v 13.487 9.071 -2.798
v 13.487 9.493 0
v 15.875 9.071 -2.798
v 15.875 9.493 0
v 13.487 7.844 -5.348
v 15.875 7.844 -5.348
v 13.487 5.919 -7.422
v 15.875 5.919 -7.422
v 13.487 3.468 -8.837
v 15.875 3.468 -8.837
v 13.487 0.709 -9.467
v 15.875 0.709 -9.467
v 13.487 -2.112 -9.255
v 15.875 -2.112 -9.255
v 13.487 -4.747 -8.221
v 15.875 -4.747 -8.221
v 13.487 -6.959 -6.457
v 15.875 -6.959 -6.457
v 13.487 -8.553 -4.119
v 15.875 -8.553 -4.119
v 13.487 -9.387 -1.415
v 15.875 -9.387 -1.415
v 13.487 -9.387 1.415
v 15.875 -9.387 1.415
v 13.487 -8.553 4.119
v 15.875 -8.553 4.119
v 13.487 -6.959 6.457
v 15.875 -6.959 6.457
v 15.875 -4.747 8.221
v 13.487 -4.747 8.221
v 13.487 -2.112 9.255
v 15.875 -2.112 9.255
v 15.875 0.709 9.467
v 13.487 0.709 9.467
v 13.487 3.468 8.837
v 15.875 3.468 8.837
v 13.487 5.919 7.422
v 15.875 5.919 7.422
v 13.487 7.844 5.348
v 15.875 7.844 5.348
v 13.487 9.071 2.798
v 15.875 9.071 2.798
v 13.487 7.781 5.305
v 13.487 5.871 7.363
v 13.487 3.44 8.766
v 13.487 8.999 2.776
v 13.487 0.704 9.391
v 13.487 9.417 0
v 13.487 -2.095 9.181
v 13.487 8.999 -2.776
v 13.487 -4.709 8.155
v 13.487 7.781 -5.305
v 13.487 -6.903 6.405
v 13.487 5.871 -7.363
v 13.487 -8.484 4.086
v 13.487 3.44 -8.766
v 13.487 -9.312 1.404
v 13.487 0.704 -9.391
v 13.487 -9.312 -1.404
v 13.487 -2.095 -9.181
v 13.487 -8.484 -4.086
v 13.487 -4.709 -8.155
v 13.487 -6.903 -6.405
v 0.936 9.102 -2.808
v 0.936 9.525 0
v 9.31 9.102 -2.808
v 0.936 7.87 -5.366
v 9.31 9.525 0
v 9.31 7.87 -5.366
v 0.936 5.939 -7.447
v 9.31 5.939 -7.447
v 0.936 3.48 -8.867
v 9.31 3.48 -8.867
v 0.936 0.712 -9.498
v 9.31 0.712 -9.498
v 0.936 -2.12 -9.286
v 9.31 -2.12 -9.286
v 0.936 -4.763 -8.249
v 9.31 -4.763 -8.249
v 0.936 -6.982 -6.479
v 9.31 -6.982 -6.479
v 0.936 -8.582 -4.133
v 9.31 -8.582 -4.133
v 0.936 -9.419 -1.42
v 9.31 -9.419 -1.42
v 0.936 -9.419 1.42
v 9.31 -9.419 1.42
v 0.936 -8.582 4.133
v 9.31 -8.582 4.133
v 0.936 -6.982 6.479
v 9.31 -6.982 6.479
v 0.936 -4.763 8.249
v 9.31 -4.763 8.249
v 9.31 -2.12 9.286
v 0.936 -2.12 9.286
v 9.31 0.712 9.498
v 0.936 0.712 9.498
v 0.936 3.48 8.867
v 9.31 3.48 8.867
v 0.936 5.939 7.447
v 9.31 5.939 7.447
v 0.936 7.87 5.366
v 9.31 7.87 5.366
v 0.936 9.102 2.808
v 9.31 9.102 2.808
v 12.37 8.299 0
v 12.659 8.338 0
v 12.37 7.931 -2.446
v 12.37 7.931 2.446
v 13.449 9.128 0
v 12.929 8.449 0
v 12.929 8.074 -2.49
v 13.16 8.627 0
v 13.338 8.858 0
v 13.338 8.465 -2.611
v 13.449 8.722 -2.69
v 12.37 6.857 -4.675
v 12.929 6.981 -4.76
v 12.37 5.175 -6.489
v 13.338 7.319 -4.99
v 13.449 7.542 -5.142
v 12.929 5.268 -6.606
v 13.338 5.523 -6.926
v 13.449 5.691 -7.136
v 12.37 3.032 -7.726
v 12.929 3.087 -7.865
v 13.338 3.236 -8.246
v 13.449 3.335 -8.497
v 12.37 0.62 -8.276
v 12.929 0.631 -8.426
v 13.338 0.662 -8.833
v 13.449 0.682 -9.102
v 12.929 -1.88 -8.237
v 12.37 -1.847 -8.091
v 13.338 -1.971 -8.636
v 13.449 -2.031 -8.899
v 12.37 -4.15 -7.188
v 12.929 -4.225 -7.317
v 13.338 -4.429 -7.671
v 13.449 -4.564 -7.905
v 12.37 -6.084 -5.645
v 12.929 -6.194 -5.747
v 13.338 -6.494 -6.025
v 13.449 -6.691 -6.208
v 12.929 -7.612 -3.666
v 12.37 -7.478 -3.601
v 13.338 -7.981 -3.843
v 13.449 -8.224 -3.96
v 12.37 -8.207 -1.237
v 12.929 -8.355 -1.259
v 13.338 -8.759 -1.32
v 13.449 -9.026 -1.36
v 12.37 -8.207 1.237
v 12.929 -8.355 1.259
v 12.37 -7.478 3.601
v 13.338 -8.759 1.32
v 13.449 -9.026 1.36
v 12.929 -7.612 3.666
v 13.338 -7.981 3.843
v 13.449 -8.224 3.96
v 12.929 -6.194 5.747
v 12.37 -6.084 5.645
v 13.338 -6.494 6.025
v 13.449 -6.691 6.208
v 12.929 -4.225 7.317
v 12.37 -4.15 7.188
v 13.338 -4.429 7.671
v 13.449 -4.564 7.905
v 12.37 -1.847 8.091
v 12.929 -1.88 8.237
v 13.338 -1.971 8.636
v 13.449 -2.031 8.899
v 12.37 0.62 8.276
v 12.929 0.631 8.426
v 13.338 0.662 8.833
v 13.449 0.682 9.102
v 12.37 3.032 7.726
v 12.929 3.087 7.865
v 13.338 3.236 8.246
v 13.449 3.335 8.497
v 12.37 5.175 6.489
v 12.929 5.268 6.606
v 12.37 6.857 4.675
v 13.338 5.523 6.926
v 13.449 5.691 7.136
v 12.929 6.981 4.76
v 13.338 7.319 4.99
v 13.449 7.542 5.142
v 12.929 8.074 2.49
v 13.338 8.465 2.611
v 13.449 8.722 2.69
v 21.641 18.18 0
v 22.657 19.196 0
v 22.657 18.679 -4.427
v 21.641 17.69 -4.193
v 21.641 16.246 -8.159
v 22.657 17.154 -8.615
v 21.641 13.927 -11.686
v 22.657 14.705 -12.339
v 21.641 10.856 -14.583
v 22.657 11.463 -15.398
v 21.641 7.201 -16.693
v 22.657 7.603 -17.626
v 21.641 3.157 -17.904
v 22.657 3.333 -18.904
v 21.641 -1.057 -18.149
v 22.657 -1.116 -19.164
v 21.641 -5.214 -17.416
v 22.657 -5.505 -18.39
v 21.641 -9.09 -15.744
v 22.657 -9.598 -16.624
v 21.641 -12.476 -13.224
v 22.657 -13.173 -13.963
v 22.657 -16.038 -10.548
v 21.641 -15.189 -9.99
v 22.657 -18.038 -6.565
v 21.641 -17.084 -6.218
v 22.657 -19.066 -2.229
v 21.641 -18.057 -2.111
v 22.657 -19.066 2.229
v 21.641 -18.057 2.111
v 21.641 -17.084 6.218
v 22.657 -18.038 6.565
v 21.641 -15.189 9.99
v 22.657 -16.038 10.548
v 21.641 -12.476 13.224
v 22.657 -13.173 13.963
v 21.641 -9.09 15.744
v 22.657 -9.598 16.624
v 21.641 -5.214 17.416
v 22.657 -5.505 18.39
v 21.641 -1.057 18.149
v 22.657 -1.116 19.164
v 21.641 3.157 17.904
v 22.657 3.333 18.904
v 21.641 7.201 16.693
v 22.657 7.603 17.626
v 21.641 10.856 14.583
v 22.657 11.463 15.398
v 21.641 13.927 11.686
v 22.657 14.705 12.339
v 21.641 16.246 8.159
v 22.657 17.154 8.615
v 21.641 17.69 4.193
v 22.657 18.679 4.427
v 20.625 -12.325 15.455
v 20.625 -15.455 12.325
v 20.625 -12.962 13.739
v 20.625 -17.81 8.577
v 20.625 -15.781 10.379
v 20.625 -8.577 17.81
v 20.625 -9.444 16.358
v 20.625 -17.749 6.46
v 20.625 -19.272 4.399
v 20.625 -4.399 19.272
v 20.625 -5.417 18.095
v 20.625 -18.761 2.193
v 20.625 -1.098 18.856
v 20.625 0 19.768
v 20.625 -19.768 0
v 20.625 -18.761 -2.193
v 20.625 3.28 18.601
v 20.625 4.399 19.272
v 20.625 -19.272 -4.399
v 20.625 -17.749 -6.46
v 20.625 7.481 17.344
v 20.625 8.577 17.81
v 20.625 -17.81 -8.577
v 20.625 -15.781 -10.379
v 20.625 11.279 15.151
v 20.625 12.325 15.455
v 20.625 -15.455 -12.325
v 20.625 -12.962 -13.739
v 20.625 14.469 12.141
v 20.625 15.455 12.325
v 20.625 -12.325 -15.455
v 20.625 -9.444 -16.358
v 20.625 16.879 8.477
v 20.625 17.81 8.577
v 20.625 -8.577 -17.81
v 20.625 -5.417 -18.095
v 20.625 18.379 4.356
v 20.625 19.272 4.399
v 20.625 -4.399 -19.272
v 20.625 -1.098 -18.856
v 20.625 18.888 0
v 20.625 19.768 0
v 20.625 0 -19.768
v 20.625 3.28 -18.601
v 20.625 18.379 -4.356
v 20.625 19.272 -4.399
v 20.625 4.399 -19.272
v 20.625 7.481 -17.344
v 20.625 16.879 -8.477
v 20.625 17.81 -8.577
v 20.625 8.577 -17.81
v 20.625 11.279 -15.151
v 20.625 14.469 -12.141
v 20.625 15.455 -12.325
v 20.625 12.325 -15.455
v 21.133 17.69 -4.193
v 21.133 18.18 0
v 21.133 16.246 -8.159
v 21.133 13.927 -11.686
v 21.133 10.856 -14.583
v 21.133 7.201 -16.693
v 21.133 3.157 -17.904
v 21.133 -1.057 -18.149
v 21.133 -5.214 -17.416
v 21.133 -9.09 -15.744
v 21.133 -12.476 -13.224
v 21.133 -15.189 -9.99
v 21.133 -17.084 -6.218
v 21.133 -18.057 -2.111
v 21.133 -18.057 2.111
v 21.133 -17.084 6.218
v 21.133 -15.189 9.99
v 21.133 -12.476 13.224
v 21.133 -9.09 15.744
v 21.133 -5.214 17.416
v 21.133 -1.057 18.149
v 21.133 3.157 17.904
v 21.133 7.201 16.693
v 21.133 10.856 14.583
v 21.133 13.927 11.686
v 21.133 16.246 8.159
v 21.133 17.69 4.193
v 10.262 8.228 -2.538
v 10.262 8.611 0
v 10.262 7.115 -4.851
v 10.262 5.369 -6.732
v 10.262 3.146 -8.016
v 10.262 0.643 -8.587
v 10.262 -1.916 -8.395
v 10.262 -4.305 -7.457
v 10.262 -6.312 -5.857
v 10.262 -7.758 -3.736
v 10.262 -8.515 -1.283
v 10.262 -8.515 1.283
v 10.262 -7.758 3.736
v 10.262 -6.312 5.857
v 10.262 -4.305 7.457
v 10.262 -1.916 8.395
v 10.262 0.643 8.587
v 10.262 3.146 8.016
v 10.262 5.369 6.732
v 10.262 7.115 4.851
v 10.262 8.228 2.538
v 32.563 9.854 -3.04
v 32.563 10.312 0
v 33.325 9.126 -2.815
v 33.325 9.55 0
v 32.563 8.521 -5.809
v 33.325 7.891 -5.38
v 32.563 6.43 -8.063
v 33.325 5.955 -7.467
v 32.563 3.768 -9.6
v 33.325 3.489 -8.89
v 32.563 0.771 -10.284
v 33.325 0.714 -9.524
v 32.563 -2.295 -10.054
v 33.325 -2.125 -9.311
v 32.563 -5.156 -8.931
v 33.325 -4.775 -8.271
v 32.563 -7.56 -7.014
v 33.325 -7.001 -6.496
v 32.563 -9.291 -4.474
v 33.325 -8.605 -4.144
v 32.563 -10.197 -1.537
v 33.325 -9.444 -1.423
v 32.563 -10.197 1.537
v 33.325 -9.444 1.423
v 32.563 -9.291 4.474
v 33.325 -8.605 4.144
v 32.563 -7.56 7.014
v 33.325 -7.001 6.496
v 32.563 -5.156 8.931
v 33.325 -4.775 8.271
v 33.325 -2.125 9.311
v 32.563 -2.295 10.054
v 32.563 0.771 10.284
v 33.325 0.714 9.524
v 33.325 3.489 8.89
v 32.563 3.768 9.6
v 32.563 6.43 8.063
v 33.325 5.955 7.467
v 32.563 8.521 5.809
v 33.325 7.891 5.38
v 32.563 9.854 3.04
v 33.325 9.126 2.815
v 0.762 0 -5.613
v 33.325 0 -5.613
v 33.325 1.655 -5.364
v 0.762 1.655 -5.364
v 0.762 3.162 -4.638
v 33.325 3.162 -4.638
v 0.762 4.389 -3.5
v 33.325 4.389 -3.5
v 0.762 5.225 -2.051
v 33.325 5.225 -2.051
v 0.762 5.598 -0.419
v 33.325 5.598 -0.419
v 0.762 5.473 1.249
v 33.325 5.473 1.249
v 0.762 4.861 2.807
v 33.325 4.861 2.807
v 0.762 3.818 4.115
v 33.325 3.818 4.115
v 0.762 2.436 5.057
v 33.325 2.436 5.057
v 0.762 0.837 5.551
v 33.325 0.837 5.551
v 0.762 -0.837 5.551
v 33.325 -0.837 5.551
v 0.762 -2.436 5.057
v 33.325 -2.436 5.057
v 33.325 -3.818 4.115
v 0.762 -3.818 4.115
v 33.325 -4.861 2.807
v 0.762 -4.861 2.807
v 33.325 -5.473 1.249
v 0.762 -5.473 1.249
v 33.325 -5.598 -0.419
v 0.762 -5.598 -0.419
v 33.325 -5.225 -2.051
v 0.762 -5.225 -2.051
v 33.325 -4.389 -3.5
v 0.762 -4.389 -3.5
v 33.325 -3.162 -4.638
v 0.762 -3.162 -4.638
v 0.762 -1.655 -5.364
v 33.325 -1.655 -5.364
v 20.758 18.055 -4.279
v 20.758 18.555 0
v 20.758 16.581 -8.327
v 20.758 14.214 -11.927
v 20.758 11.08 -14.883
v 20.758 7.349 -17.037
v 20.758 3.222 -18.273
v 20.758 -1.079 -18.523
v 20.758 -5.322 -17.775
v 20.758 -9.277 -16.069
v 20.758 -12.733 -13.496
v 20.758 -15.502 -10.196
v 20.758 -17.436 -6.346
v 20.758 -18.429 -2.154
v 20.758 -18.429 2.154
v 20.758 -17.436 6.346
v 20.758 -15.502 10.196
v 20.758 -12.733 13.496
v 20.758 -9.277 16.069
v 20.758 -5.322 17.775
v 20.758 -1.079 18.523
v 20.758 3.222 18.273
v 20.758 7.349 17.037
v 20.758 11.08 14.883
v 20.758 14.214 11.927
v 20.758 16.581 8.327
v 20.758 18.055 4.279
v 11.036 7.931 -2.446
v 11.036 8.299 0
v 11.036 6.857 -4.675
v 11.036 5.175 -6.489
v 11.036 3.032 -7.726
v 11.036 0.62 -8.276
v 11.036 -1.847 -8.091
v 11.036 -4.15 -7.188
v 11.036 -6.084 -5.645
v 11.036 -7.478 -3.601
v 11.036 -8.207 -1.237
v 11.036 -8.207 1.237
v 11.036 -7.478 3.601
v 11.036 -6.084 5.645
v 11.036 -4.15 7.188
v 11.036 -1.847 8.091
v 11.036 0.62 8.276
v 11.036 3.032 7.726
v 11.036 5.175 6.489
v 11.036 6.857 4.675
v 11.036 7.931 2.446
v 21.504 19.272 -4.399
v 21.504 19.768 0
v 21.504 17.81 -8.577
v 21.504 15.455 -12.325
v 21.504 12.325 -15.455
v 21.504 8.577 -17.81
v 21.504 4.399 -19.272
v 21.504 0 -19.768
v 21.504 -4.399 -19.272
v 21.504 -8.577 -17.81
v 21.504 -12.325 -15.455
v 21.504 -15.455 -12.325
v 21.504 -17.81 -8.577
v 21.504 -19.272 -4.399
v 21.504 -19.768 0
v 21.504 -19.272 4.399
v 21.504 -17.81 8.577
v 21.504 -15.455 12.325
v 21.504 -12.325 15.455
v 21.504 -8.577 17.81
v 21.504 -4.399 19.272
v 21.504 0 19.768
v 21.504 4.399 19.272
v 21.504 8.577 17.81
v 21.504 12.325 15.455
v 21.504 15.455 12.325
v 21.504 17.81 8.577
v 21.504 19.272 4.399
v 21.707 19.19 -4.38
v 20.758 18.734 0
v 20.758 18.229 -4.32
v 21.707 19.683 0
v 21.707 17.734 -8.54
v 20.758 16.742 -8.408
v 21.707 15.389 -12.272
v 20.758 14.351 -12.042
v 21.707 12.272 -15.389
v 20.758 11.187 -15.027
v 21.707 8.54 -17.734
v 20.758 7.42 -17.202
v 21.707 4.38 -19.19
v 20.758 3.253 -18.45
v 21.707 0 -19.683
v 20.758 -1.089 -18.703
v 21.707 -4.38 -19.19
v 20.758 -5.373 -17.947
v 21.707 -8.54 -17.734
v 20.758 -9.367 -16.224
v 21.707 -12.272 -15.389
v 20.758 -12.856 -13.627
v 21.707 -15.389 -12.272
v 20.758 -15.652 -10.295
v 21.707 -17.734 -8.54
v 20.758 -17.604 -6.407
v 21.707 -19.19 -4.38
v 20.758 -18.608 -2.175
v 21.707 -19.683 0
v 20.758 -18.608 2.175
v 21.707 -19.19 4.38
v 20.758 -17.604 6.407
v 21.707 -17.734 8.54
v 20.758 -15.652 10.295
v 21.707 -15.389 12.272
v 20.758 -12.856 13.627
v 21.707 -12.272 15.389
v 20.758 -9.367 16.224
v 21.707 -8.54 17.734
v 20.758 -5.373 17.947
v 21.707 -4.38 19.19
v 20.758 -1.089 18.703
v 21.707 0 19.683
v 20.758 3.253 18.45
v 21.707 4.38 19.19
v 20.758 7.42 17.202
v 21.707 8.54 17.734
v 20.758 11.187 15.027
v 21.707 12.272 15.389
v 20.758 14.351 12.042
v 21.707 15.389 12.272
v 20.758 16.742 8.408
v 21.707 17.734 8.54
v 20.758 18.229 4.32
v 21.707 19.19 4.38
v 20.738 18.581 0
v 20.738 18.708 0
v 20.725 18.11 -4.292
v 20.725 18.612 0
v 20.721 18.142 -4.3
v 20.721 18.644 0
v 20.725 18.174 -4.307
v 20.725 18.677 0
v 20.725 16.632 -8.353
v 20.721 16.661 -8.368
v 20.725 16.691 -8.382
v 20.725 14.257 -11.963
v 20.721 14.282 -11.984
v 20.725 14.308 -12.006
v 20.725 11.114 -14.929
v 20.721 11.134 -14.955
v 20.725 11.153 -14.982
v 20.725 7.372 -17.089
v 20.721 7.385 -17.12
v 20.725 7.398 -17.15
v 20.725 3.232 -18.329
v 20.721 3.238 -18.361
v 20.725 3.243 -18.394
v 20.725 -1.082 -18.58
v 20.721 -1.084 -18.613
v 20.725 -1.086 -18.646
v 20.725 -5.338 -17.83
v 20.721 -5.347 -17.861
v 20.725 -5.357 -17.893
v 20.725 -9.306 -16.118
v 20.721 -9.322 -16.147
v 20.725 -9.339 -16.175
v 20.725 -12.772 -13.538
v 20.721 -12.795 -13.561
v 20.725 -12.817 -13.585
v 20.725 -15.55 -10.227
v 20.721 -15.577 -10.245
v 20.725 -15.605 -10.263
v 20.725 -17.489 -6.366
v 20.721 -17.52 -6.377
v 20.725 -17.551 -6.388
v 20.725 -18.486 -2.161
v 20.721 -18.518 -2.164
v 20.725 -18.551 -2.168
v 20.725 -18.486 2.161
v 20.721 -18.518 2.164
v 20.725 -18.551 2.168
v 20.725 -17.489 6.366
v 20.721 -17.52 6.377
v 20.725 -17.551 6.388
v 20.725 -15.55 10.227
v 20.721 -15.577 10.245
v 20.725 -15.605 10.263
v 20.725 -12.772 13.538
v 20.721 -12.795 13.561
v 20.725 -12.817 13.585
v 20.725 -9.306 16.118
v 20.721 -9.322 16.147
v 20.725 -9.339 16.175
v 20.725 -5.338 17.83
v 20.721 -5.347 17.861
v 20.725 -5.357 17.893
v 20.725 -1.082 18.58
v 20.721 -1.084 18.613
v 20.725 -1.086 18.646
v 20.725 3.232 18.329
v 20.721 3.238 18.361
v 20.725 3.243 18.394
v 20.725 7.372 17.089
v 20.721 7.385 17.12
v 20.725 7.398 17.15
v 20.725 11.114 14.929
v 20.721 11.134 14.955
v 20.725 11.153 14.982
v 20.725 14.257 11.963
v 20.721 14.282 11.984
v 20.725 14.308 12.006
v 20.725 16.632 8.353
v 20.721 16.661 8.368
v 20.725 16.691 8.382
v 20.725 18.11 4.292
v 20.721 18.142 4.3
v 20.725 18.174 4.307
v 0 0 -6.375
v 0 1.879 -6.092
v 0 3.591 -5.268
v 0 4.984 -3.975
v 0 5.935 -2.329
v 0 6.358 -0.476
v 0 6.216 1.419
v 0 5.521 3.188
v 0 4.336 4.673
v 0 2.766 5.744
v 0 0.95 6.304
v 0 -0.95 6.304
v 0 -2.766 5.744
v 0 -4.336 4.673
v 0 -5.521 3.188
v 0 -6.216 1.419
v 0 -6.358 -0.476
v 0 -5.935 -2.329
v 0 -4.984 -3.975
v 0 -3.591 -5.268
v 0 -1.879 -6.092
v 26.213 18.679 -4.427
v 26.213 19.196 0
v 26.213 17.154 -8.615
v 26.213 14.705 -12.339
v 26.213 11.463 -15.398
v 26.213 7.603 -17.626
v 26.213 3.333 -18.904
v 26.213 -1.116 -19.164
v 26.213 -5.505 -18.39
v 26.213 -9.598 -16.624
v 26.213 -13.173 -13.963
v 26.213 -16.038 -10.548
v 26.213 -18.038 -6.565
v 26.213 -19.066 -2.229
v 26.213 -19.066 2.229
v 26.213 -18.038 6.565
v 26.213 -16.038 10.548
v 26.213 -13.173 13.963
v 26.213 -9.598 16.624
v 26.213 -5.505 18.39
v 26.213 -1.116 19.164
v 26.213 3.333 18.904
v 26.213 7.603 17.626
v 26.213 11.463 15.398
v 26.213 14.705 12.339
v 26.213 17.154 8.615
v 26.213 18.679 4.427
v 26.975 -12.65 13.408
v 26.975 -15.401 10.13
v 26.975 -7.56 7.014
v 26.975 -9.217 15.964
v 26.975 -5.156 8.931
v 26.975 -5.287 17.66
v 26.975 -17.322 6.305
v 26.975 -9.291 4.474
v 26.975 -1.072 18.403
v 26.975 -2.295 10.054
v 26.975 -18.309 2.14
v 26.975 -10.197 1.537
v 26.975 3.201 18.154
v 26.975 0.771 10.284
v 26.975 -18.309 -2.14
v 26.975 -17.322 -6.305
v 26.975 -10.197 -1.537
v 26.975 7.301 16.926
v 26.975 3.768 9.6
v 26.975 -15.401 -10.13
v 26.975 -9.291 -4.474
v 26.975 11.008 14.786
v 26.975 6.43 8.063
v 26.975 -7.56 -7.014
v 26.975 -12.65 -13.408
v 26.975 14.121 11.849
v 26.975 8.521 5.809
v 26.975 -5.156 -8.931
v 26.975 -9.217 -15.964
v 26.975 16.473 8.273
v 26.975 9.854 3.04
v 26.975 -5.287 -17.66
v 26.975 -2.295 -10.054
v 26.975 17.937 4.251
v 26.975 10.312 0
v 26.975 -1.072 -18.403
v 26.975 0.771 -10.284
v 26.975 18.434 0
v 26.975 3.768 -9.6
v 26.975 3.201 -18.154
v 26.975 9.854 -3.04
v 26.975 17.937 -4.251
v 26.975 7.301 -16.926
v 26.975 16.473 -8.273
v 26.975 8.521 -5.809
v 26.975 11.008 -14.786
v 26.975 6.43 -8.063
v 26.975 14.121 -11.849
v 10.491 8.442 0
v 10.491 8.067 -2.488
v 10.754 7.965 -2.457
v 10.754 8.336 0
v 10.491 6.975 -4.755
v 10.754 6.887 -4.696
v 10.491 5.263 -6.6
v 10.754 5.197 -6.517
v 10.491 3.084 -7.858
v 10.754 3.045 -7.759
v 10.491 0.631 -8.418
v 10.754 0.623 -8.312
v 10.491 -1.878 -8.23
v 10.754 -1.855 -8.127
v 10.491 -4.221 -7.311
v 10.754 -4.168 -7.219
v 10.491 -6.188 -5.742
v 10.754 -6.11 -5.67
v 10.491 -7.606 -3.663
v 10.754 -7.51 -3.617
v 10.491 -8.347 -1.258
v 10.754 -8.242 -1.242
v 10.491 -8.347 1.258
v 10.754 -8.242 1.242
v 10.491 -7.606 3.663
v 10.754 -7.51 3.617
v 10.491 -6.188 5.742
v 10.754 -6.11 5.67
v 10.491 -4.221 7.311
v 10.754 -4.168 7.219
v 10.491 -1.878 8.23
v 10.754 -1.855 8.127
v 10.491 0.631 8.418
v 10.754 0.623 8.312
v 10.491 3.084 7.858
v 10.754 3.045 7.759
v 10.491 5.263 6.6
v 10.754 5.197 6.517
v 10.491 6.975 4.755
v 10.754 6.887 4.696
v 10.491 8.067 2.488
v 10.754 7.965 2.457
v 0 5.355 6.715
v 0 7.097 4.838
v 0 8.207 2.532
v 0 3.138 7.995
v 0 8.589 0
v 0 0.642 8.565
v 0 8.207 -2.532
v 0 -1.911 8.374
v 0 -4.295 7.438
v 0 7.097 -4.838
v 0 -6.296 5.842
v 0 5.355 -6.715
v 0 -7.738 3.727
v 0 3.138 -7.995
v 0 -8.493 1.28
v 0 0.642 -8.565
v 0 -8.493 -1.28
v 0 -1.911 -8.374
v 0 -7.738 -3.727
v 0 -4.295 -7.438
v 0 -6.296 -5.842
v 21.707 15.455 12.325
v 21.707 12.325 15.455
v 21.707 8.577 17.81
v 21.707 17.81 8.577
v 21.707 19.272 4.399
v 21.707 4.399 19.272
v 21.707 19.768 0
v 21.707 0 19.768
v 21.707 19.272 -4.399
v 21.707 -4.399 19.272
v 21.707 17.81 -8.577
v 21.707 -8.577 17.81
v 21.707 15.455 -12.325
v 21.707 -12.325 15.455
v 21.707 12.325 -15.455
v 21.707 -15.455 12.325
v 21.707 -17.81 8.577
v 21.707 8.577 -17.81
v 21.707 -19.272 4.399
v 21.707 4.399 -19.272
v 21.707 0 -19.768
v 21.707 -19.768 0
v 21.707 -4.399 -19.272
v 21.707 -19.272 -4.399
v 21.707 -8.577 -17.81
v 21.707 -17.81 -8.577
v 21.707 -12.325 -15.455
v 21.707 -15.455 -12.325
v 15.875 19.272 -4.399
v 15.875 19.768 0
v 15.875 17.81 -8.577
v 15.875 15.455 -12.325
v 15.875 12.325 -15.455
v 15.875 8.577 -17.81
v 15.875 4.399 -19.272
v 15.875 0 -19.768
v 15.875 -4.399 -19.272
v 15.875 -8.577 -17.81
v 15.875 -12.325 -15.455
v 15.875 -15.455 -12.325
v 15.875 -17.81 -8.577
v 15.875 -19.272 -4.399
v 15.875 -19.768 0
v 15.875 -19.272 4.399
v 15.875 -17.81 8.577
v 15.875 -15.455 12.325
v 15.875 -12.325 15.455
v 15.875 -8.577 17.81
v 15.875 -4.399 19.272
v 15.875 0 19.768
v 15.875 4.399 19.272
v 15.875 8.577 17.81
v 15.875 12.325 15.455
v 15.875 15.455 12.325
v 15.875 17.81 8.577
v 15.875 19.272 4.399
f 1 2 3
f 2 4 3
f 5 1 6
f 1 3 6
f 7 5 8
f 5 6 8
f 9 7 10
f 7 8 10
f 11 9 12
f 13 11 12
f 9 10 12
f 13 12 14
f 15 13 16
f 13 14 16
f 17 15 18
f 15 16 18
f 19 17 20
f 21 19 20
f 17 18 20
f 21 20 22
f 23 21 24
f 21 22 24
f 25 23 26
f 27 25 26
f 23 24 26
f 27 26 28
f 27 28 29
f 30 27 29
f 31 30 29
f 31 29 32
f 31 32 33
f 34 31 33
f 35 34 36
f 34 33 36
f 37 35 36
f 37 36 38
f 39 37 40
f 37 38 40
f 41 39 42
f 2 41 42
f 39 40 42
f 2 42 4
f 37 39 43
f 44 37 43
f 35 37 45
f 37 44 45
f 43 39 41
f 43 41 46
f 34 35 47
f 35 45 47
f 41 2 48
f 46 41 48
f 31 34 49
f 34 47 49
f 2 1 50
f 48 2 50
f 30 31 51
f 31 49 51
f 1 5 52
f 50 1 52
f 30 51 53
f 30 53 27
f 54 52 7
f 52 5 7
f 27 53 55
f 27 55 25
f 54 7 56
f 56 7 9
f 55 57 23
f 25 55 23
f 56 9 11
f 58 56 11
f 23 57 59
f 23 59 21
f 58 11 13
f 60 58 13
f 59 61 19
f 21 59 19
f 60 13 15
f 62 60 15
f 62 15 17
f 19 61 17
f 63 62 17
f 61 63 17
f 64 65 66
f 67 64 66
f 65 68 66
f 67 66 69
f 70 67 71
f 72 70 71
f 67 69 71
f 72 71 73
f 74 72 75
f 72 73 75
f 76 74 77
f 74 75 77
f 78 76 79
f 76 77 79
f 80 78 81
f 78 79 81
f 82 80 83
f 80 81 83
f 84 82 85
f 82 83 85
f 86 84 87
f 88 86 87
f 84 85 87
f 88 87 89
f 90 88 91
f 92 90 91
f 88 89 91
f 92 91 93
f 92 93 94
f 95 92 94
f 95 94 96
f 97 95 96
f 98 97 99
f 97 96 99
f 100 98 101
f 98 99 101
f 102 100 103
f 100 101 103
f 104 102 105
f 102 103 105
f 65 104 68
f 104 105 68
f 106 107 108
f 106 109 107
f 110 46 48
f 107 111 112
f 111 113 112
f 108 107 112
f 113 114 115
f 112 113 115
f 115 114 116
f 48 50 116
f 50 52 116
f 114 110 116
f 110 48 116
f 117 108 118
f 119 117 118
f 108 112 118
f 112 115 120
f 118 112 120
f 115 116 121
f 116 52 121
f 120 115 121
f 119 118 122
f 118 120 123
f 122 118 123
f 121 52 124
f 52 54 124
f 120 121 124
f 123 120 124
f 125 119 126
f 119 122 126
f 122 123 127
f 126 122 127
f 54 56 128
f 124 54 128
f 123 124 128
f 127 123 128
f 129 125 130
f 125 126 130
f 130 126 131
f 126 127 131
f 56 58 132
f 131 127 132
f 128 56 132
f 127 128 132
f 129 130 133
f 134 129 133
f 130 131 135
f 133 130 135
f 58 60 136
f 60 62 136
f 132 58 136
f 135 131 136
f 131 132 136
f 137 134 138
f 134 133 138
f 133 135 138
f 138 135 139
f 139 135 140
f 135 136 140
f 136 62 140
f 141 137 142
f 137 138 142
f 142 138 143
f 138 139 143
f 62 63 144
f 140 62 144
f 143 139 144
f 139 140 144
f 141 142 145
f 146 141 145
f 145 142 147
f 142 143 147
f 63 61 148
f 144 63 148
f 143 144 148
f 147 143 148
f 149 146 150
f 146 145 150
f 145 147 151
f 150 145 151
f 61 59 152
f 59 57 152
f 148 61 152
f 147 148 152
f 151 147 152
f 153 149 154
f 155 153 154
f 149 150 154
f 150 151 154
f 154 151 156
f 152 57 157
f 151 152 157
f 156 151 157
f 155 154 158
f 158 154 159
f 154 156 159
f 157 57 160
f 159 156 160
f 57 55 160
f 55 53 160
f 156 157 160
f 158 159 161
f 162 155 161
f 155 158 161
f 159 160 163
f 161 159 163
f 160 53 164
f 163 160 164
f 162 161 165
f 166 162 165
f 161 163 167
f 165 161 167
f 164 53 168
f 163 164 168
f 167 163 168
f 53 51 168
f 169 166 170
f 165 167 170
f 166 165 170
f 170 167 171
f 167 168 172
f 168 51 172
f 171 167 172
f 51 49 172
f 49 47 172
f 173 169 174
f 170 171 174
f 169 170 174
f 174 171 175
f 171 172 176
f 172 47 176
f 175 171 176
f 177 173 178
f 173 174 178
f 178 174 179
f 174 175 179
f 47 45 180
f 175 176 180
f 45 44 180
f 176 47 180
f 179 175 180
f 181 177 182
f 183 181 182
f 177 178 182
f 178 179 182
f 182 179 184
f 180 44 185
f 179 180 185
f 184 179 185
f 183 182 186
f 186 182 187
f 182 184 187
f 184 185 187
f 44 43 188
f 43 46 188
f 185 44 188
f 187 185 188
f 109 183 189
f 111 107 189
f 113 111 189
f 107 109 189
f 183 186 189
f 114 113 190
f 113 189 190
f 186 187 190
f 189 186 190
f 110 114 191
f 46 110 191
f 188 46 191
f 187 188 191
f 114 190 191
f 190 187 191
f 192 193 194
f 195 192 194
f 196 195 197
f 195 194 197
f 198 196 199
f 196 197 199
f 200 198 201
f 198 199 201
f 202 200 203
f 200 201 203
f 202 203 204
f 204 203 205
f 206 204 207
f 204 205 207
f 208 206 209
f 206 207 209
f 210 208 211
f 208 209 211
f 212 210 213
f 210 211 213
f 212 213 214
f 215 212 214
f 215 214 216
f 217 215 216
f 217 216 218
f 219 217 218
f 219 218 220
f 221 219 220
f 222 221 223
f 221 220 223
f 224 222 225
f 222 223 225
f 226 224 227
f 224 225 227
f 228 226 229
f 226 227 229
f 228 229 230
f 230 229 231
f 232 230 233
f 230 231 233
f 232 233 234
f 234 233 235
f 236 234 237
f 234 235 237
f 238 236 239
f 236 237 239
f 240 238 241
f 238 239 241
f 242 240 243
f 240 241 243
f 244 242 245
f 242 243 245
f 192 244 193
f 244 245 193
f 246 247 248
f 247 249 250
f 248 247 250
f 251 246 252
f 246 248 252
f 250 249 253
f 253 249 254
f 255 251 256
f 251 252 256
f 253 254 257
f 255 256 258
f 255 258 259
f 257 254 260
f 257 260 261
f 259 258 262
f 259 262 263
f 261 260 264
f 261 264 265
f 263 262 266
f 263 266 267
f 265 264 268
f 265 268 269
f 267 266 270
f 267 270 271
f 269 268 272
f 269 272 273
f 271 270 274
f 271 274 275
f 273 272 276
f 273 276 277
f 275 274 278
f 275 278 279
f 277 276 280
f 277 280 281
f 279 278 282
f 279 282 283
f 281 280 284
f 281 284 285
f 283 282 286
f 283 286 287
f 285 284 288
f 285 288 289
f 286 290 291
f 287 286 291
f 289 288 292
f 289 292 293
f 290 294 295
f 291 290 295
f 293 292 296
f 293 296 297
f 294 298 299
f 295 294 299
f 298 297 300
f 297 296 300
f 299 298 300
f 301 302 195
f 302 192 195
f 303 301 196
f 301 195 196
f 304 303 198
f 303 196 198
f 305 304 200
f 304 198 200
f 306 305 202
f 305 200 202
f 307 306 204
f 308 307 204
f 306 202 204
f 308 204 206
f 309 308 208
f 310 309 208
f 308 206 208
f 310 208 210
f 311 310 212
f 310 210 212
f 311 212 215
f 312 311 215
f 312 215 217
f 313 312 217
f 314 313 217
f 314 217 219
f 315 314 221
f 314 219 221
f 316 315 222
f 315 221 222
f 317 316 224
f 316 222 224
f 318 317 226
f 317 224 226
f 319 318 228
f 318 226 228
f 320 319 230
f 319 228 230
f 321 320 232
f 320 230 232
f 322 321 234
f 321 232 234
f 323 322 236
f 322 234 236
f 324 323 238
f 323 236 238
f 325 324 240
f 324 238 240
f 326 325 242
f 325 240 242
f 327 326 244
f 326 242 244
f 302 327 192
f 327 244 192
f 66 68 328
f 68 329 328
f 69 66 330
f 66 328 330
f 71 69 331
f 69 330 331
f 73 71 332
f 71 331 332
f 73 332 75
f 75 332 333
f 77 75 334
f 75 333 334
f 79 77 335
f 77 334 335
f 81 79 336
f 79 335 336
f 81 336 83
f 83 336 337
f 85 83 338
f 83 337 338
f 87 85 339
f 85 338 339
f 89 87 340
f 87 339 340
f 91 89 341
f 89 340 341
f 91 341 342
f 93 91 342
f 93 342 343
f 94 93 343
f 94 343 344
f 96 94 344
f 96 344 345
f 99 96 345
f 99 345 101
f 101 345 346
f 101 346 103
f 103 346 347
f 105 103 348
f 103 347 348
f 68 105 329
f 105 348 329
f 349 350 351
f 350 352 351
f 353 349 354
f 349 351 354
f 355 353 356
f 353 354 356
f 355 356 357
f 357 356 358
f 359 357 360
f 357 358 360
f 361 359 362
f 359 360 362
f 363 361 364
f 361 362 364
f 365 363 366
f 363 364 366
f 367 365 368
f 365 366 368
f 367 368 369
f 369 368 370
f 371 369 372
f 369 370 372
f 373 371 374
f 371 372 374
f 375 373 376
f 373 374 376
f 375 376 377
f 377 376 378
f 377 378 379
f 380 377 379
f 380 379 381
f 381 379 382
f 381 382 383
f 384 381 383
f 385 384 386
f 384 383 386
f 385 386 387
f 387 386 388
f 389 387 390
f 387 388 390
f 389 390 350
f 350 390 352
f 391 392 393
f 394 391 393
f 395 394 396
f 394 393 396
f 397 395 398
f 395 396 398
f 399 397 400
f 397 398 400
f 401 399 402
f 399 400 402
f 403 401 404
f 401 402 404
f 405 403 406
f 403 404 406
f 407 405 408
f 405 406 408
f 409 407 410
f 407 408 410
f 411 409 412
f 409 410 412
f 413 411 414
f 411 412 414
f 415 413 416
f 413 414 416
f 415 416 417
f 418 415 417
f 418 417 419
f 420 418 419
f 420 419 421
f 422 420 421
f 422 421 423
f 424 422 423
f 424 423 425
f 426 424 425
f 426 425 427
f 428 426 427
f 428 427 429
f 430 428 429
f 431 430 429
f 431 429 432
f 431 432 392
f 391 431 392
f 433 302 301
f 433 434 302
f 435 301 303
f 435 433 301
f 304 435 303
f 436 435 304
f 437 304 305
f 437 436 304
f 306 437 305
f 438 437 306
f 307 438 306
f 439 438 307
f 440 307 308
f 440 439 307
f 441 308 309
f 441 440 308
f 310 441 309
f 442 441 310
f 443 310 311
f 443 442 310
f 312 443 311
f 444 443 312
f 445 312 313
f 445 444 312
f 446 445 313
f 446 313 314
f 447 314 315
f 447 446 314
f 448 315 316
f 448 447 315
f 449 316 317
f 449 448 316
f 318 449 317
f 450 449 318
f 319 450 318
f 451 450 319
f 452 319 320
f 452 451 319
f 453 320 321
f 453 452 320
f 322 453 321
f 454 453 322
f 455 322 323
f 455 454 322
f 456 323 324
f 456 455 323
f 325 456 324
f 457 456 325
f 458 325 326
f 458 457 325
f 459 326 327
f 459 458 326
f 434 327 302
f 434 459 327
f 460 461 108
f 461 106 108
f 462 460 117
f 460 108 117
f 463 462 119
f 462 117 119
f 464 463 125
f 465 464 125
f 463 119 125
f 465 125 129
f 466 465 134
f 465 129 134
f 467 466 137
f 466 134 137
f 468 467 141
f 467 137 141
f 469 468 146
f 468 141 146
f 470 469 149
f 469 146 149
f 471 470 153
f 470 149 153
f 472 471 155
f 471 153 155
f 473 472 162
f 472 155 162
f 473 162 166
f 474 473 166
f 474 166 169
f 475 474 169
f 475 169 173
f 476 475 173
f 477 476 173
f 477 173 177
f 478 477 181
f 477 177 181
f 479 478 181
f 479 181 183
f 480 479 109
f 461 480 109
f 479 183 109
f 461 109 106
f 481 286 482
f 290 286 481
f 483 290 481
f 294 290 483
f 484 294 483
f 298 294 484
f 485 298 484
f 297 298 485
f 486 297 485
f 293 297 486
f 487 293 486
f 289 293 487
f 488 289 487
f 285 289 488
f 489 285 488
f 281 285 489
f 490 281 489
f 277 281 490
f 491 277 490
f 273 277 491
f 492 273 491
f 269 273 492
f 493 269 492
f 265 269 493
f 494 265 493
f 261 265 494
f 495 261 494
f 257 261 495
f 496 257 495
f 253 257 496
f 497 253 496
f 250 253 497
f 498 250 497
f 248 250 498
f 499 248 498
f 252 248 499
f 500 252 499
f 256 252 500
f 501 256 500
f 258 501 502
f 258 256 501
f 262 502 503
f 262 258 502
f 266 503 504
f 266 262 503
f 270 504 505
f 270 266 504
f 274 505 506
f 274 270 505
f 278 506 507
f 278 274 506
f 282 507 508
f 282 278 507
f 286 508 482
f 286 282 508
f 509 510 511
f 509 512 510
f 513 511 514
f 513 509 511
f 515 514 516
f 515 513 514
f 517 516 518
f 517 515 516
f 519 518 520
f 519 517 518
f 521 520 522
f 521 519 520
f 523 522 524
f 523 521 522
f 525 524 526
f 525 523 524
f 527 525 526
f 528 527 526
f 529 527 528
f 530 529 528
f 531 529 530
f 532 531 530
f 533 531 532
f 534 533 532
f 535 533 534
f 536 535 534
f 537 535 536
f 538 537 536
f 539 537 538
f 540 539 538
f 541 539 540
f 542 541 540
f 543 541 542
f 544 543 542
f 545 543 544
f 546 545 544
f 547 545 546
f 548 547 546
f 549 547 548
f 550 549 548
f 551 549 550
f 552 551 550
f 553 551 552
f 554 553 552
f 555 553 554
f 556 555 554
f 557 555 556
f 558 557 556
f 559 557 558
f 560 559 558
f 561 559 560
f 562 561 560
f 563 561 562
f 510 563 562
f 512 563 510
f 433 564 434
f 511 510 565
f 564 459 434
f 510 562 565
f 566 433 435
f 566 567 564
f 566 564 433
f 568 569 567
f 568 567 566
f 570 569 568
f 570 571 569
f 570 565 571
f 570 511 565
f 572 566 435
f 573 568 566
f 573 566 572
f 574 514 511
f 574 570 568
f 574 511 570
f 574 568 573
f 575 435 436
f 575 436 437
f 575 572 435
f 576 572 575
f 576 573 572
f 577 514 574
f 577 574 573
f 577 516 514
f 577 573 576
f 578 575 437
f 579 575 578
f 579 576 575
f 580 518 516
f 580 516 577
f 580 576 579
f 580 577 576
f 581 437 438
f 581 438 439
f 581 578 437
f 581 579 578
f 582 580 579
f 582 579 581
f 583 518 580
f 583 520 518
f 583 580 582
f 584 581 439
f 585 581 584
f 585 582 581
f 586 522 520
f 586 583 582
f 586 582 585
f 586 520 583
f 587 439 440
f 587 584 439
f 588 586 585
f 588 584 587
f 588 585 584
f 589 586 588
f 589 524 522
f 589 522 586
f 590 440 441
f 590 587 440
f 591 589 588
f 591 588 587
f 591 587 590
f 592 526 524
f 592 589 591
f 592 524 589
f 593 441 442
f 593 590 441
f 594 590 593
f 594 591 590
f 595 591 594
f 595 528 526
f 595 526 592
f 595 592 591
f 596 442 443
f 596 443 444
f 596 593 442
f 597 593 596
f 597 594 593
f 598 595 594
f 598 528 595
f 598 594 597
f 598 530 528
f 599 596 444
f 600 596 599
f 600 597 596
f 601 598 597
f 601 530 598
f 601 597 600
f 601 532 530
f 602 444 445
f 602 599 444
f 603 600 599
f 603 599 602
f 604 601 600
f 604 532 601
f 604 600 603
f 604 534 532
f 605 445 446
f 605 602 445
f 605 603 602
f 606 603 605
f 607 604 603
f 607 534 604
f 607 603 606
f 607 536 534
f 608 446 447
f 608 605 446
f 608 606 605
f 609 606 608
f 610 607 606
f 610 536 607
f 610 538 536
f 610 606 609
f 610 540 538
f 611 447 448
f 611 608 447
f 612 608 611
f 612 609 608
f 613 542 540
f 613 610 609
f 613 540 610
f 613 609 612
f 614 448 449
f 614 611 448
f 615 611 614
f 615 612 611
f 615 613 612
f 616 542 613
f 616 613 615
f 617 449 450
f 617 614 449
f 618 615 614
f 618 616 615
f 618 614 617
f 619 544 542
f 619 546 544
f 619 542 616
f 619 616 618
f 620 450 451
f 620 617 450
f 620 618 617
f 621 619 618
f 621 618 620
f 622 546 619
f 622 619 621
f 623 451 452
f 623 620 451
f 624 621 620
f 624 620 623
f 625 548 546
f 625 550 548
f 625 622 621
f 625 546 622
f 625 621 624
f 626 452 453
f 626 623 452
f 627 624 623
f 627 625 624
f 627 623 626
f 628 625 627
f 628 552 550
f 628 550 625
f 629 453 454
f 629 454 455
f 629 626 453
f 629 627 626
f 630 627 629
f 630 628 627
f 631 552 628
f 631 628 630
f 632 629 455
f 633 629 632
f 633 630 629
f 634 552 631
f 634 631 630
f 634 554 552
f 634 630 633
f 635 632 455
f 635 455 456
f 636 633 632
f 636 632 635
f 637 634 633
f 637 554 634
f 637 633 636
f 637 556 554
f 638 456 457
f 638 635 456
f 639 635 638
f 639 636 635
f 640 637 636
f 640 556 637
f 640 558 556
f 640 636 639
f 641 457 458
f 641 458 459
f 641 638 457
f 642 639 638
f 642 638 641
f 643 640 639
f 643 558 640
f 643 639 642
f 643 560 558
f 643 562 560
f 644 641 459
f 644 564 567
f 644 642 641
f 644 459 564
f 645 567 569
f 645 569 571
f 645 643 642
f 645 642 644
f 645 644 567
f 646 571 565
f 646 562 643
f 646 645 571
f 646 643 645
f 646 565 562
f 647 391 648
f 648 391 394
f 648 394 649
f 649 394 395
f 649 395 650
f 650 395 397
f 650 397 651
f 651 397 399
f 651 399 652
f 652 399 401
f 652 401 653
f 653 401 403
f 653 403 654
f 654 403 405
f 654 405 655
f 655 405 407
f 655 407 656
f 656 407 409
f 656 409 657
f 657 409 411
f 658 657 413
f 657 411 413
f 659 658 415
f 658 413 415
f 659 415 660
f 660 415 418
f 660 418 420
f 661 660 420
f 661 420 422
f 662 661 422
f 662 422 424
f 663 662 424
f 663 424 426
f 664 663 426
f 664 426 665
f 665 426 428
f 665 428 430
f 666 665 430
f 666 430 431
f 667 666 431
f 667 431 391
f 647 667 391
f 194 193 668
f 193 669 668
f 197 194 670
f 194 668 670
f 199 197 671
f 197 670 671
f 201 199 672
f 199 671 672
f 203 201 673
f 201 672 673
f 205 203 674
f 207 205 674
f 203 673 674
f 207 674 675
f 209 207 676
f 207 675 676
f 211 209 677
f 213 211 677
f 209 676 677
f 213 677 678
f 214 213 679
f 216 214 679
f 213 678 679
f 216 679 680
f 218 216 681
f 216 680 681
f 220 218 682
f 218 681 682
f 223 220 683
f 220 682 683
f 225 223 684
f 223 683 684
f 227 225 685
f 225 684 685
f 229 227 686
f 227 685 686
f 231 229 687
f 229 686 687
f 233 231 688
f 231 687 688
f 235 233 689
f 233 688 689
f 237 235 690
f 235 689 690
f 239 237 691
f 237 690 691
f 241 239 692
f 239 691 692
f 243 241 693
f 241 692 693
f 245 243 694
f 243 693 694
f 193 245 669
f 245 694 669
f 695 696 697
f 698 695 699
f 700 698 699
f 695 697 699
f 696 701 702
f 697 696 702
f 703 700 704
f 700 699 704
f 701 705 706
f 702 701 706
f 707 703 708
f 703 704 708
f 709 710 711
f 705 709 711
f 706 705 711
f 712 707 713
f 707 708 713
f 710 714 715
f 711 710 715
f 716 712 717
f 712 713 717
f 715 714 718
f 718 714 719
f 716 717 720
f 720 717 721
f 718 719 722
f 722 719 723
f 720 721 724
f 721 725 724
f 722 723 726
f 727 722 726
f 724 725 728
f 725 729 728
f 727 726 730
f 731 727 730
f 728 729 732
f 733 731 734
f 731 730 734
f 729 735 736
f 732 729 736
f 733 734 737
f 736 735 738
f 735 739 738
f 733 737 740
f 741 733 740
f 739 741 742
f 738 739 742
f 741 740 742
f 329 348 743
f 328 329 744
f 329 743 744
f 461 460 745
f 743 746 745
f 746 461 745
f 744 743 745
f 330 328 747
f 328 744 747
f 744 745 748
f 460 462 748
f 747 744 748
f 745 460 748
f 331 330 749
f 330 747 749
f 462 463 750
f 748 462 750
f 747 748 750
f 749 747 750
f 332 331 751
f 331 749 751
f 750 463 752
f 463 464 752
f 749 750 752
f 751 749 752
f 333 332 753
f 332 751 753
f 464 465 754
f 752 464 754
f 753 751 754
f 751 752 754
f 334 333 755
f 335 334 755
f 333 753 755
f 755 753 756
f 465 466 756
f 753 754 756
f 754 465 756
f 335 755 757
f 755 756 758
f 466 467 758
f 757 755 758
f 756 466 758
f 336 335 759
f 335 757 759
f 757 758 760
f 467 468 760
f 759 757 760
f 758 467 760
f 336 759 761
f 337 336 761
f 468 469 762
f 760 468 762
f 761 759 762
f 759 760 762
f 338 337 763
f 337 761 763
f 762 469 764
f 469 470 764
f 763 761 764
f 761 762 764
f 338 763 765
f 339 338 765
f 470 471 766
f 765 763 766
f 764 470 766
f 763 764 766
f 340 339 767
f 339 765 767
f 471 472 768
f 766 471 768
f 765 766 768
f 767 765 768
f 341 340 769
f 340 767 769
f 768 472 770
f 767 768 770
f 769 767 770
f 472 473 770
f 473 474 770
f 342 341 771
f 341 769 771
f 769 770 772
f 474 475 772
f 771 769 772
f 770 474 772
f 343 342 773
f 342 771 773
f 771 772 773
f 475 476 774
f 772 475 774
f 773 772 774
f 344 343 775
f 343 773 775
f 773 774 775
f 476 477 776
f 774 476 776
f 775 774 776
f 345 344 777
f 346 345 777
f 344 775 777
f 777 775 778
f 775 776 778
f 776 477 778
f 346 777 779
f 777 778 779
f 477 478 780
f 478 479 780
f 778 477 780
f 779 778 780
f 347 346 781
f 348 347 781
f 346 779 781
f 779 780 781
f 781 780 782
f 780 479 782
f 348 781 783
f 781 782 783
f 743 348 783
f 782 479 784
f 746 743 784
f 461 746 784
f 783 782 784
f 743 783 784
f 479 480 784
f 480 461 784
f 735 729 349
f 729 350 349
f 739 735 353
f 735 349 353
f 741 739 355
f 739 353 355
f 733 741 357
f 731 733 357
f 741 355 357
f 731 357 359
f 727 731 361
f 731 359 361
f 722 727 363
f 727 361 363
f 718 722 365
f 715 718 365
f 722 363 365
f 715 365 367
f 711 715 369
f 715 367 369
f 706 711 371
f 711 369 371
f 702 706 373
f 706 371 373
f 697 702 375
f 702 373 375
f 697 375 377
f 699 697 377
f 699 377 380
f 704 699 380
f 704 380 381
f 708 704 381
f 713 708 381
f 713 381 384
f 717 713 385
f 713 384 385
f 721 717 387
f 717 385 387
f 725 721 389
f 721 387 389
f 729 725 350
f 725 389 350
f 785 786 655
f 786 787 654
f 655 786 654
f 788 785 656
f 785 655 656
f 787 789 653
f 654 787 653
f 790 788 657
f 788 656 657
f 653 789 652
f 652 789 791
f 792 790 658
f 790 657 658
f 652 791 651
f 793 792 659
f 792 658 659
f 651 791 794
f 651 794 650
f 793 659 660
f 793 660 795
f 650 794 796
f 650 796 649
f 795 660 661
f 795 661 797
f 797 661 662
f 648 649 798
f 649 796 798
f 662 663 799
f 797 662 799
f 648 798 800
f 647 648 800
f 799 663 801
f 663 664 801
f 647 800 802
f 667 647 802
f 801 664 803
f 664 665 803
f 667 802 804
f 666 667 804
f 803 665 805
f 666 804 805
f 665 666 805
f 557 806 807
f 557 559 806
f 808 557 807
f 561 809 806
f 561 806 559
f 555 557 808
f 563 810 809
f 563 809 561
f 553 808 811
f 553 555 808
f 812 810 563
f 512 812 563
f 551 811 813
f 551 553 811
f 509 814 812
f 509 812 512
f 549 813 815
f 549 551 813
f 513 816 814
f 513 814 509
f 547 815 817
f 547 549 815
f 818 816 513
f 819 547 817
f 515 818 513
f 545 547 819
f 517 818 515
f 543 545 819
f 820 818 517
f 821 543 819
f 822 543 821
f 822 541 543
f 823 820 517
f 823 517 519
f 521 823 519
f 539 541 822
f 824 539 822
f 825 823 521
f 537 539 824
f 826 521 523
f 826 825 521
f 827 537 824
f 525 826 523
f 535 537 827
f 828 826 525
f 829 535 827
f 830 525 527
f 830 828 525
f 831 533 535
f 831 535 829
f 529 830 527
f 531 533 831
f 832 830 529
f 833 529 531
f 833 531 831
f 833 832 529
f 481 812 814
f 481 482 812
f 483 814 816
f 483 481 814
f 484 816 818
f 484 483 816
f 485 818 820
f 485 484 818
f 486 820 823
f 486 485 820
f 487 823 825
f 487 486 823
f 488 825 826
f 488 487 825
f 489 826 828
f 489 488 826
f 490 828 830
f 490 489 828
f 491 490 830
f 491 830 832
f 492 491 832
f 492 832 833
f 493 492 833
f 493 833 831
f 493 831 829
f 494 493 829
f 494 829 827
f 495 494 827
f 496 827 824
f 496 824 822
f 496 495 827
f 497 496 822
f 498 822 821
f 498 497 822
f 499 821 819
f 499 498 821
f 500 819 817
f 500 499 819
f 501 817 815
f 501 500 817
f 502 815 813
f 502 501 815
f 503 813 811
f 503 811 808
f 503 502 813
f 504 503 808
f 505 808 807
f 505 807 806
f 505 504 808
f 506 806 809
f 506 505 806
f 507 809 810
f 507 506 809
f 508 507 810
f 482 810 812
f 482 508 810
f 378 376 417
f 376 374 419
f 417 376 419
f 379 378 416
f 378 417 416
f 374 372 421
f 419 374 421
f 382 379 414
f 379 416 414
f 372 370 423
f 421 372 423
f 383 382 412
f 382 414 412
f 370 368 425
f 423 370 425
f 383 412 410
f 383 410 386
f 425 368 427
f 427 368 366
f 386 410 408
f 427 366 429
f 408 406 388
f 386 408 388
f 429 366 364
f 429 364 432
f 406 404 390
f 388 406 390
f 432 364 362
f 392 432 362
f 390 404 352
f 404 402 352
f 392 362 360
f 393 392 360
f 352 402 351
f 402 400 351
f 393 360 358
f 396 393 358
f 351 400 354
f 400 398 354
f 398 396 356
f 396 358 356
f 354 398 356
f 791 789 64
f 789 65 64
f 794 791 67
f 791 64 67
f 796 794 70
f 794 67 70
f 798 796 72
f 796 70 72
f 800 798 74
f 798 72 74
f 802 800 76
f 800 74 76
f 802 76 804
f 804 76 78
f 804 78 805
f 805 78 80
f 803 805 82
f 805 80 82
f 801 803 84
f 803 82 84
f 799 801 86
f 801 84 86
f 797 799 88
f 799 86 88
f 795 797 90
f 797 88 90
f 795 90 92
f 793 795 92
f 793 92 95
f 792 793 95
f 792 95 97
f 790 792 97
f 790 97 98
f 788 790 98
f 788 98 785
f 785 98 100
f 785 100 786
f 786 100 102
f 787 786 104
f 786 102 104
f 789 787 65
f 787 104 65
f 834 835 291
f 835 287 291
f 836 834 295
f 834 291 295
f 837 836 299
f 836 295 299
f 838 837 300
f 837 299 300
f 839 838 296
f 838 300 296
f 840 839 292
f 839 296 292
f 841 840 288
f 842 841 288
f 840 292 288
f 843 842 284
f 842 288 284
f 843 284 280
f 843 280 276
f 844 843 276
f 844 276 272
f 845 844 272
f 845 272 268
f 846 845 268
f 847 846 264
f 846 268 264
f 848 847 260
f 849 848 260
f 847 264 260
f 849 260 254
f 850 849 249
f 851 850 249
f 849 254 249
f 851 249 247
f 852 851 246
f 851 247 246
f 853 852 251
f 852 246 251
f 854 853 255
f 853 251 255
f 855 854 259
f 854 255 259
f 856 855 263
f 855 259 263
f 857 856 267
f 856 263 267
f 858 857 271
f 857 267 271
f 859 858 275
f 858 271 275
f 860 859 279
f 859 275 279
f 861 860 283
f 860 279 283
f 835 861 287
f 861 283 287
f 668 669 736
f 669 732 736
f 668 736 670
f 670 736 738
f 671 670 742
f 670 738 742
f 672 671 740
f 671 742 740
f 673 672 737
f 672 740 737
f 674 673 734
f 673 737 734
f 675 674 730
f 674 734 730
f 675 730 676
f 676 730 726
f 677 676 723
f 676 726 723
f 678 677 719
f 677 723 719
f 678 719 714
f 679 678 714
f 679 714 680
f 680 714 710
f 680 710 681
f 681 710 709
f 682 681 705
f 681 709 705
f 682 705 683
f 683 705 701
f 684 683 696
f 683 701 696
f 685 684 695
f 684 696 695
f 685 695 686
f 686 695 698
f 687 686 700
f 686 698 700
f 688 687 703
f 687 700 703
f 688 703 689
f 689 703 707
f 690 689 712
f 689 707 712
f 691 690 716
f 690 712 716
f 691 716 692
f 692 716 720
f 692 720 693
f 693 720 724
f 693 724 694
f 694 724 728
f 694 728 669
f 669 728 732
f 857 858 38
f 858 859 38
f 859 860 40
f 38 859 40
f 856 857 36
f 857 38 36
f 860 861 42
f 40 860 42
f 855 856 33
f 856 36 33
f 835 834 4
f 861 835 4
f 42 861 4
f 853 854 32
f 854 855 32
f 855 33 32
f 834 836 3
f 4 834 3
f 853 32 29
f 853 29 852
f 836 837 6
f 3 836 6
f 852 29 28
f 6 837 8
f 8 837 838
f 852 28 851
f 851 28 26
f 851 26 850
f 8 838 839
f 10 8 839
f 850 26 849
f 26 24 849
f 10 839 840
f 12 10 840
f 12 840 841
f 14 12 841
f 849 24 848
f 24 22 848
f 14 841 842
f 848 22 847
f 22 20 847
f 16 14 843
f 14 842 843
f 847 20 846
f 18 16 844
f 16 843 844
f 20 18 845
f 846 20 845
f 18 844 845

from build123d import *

# Parameters (mm, degrees)
HOLE1_D           = 11.2268
HOLE1_CSINK_D     = 12.7508
HOLE1_CSINK_ANGLE = 90


with BuildPart() as part:
    # Sketch1 → Revolve1 (revolve)
    with BuildSketch(Plane.XY):
        with BuildLine():
            Line((0, 0), (0, 8.58901))
            Line((0, 8.58901), (0.93599, 9.525))
            Line((0.93599, 9.525), (9.310047461, 9.525))
            Line((9.310047461, 9.525), (10.262333187, 8.610821042))
            ThreePointArc((10.262333187, 8.610821042), (10.619173954, 8.380210754), (11.0363, 8.29945))
            Line((11.0363, 8.29945), (12.3698, 8.29945))
            ThreePointArc((12.3698, 8.29945), (13.160062539, 8.626787461), (13.4874, 9.41705))
            Line((13.4874, 9.41705), (13.4874, 9.49325))
            Line((13.4874, 9.49325), (15.875, 9.49325))
            Line((15.875, 9.49325), (15.875, 0))
            Line((15.875, 0), (0, 0))
        make_face()
    revolve(axis=Axis((15.875, 0, 0), (-1, 0, 0)))

    # Sketch2 → Revolve2 (revolve)
    with BuildSketch(Plane.XY):
        Polygon((15.875, 0), (15.875, 19.76755), (20.6248, 19.76755), (20.6248, 18.18005), (21.6408, 18.18005), (22.6568, 19.19605), (26.2128, 19.19605), (26.9748, 18.43405), (26.9748, 0), align=None)
    revolve(axis=Axis((26.9748, 0, 0), (-1, 0, 0)))

    # Sketch3 → Revolve3 (revolve)
    with BuildSketch(Plane.XY):
        Polygon((26.9748, 0), (26.9748, 10.3124), (32.5628, 10.3124), (33.3248, 9.5504), (33.3248, 0), align=None)
    revolve(axis=Axis((33.3248, 0, 0), (-1, 0, 0)))

    # Hole1 (through all)
    with Locations(Plane.ZY):
        with Locations((0, 0)):
            CounterSinkHole(HOLE1_D / 2, HOLE1_CSINK_D / 2, counter_sink_angle=HOLE1_CSINK_ANGLE)

    # Sketch6 → Revolve4 (revolve)
    with BuildSketch(Plane.XY):
        with BuildLine():
            Line((20.6248, 17.92605), (21.6408, 17.92605))
            Line((21.6408, 17.92605), (21.6408, 18.18005))
            Line((21.6408, 18.18005), (21.1328, 18.18005))
            Line((21.1328, 18.18005), (20.758182072, 18.554667928))
            ThreePointArc((20.758182072, 18.554667928), (20.720984633, 18.64447049), (20.758182072, 18.734273051))
            Line((20.758182072, 18.734273051), (21.707290825, 19.683381804))
            Line((21.707290825, 19.683381804), (21.707290825, 19.76755))
            Line((21.707290825, 19.76755), (21.504090825, 19.76755))
            Line((21.504090825, 19.76755), (20.6248, 18.888259175))
            Line((20.6248, 18.888259175), (20.6248, 17.92605))
        make_face()
    revolve(axis=Axis((21.6408, 0, 0), (-1, 0, 0)))


solid = part.part
